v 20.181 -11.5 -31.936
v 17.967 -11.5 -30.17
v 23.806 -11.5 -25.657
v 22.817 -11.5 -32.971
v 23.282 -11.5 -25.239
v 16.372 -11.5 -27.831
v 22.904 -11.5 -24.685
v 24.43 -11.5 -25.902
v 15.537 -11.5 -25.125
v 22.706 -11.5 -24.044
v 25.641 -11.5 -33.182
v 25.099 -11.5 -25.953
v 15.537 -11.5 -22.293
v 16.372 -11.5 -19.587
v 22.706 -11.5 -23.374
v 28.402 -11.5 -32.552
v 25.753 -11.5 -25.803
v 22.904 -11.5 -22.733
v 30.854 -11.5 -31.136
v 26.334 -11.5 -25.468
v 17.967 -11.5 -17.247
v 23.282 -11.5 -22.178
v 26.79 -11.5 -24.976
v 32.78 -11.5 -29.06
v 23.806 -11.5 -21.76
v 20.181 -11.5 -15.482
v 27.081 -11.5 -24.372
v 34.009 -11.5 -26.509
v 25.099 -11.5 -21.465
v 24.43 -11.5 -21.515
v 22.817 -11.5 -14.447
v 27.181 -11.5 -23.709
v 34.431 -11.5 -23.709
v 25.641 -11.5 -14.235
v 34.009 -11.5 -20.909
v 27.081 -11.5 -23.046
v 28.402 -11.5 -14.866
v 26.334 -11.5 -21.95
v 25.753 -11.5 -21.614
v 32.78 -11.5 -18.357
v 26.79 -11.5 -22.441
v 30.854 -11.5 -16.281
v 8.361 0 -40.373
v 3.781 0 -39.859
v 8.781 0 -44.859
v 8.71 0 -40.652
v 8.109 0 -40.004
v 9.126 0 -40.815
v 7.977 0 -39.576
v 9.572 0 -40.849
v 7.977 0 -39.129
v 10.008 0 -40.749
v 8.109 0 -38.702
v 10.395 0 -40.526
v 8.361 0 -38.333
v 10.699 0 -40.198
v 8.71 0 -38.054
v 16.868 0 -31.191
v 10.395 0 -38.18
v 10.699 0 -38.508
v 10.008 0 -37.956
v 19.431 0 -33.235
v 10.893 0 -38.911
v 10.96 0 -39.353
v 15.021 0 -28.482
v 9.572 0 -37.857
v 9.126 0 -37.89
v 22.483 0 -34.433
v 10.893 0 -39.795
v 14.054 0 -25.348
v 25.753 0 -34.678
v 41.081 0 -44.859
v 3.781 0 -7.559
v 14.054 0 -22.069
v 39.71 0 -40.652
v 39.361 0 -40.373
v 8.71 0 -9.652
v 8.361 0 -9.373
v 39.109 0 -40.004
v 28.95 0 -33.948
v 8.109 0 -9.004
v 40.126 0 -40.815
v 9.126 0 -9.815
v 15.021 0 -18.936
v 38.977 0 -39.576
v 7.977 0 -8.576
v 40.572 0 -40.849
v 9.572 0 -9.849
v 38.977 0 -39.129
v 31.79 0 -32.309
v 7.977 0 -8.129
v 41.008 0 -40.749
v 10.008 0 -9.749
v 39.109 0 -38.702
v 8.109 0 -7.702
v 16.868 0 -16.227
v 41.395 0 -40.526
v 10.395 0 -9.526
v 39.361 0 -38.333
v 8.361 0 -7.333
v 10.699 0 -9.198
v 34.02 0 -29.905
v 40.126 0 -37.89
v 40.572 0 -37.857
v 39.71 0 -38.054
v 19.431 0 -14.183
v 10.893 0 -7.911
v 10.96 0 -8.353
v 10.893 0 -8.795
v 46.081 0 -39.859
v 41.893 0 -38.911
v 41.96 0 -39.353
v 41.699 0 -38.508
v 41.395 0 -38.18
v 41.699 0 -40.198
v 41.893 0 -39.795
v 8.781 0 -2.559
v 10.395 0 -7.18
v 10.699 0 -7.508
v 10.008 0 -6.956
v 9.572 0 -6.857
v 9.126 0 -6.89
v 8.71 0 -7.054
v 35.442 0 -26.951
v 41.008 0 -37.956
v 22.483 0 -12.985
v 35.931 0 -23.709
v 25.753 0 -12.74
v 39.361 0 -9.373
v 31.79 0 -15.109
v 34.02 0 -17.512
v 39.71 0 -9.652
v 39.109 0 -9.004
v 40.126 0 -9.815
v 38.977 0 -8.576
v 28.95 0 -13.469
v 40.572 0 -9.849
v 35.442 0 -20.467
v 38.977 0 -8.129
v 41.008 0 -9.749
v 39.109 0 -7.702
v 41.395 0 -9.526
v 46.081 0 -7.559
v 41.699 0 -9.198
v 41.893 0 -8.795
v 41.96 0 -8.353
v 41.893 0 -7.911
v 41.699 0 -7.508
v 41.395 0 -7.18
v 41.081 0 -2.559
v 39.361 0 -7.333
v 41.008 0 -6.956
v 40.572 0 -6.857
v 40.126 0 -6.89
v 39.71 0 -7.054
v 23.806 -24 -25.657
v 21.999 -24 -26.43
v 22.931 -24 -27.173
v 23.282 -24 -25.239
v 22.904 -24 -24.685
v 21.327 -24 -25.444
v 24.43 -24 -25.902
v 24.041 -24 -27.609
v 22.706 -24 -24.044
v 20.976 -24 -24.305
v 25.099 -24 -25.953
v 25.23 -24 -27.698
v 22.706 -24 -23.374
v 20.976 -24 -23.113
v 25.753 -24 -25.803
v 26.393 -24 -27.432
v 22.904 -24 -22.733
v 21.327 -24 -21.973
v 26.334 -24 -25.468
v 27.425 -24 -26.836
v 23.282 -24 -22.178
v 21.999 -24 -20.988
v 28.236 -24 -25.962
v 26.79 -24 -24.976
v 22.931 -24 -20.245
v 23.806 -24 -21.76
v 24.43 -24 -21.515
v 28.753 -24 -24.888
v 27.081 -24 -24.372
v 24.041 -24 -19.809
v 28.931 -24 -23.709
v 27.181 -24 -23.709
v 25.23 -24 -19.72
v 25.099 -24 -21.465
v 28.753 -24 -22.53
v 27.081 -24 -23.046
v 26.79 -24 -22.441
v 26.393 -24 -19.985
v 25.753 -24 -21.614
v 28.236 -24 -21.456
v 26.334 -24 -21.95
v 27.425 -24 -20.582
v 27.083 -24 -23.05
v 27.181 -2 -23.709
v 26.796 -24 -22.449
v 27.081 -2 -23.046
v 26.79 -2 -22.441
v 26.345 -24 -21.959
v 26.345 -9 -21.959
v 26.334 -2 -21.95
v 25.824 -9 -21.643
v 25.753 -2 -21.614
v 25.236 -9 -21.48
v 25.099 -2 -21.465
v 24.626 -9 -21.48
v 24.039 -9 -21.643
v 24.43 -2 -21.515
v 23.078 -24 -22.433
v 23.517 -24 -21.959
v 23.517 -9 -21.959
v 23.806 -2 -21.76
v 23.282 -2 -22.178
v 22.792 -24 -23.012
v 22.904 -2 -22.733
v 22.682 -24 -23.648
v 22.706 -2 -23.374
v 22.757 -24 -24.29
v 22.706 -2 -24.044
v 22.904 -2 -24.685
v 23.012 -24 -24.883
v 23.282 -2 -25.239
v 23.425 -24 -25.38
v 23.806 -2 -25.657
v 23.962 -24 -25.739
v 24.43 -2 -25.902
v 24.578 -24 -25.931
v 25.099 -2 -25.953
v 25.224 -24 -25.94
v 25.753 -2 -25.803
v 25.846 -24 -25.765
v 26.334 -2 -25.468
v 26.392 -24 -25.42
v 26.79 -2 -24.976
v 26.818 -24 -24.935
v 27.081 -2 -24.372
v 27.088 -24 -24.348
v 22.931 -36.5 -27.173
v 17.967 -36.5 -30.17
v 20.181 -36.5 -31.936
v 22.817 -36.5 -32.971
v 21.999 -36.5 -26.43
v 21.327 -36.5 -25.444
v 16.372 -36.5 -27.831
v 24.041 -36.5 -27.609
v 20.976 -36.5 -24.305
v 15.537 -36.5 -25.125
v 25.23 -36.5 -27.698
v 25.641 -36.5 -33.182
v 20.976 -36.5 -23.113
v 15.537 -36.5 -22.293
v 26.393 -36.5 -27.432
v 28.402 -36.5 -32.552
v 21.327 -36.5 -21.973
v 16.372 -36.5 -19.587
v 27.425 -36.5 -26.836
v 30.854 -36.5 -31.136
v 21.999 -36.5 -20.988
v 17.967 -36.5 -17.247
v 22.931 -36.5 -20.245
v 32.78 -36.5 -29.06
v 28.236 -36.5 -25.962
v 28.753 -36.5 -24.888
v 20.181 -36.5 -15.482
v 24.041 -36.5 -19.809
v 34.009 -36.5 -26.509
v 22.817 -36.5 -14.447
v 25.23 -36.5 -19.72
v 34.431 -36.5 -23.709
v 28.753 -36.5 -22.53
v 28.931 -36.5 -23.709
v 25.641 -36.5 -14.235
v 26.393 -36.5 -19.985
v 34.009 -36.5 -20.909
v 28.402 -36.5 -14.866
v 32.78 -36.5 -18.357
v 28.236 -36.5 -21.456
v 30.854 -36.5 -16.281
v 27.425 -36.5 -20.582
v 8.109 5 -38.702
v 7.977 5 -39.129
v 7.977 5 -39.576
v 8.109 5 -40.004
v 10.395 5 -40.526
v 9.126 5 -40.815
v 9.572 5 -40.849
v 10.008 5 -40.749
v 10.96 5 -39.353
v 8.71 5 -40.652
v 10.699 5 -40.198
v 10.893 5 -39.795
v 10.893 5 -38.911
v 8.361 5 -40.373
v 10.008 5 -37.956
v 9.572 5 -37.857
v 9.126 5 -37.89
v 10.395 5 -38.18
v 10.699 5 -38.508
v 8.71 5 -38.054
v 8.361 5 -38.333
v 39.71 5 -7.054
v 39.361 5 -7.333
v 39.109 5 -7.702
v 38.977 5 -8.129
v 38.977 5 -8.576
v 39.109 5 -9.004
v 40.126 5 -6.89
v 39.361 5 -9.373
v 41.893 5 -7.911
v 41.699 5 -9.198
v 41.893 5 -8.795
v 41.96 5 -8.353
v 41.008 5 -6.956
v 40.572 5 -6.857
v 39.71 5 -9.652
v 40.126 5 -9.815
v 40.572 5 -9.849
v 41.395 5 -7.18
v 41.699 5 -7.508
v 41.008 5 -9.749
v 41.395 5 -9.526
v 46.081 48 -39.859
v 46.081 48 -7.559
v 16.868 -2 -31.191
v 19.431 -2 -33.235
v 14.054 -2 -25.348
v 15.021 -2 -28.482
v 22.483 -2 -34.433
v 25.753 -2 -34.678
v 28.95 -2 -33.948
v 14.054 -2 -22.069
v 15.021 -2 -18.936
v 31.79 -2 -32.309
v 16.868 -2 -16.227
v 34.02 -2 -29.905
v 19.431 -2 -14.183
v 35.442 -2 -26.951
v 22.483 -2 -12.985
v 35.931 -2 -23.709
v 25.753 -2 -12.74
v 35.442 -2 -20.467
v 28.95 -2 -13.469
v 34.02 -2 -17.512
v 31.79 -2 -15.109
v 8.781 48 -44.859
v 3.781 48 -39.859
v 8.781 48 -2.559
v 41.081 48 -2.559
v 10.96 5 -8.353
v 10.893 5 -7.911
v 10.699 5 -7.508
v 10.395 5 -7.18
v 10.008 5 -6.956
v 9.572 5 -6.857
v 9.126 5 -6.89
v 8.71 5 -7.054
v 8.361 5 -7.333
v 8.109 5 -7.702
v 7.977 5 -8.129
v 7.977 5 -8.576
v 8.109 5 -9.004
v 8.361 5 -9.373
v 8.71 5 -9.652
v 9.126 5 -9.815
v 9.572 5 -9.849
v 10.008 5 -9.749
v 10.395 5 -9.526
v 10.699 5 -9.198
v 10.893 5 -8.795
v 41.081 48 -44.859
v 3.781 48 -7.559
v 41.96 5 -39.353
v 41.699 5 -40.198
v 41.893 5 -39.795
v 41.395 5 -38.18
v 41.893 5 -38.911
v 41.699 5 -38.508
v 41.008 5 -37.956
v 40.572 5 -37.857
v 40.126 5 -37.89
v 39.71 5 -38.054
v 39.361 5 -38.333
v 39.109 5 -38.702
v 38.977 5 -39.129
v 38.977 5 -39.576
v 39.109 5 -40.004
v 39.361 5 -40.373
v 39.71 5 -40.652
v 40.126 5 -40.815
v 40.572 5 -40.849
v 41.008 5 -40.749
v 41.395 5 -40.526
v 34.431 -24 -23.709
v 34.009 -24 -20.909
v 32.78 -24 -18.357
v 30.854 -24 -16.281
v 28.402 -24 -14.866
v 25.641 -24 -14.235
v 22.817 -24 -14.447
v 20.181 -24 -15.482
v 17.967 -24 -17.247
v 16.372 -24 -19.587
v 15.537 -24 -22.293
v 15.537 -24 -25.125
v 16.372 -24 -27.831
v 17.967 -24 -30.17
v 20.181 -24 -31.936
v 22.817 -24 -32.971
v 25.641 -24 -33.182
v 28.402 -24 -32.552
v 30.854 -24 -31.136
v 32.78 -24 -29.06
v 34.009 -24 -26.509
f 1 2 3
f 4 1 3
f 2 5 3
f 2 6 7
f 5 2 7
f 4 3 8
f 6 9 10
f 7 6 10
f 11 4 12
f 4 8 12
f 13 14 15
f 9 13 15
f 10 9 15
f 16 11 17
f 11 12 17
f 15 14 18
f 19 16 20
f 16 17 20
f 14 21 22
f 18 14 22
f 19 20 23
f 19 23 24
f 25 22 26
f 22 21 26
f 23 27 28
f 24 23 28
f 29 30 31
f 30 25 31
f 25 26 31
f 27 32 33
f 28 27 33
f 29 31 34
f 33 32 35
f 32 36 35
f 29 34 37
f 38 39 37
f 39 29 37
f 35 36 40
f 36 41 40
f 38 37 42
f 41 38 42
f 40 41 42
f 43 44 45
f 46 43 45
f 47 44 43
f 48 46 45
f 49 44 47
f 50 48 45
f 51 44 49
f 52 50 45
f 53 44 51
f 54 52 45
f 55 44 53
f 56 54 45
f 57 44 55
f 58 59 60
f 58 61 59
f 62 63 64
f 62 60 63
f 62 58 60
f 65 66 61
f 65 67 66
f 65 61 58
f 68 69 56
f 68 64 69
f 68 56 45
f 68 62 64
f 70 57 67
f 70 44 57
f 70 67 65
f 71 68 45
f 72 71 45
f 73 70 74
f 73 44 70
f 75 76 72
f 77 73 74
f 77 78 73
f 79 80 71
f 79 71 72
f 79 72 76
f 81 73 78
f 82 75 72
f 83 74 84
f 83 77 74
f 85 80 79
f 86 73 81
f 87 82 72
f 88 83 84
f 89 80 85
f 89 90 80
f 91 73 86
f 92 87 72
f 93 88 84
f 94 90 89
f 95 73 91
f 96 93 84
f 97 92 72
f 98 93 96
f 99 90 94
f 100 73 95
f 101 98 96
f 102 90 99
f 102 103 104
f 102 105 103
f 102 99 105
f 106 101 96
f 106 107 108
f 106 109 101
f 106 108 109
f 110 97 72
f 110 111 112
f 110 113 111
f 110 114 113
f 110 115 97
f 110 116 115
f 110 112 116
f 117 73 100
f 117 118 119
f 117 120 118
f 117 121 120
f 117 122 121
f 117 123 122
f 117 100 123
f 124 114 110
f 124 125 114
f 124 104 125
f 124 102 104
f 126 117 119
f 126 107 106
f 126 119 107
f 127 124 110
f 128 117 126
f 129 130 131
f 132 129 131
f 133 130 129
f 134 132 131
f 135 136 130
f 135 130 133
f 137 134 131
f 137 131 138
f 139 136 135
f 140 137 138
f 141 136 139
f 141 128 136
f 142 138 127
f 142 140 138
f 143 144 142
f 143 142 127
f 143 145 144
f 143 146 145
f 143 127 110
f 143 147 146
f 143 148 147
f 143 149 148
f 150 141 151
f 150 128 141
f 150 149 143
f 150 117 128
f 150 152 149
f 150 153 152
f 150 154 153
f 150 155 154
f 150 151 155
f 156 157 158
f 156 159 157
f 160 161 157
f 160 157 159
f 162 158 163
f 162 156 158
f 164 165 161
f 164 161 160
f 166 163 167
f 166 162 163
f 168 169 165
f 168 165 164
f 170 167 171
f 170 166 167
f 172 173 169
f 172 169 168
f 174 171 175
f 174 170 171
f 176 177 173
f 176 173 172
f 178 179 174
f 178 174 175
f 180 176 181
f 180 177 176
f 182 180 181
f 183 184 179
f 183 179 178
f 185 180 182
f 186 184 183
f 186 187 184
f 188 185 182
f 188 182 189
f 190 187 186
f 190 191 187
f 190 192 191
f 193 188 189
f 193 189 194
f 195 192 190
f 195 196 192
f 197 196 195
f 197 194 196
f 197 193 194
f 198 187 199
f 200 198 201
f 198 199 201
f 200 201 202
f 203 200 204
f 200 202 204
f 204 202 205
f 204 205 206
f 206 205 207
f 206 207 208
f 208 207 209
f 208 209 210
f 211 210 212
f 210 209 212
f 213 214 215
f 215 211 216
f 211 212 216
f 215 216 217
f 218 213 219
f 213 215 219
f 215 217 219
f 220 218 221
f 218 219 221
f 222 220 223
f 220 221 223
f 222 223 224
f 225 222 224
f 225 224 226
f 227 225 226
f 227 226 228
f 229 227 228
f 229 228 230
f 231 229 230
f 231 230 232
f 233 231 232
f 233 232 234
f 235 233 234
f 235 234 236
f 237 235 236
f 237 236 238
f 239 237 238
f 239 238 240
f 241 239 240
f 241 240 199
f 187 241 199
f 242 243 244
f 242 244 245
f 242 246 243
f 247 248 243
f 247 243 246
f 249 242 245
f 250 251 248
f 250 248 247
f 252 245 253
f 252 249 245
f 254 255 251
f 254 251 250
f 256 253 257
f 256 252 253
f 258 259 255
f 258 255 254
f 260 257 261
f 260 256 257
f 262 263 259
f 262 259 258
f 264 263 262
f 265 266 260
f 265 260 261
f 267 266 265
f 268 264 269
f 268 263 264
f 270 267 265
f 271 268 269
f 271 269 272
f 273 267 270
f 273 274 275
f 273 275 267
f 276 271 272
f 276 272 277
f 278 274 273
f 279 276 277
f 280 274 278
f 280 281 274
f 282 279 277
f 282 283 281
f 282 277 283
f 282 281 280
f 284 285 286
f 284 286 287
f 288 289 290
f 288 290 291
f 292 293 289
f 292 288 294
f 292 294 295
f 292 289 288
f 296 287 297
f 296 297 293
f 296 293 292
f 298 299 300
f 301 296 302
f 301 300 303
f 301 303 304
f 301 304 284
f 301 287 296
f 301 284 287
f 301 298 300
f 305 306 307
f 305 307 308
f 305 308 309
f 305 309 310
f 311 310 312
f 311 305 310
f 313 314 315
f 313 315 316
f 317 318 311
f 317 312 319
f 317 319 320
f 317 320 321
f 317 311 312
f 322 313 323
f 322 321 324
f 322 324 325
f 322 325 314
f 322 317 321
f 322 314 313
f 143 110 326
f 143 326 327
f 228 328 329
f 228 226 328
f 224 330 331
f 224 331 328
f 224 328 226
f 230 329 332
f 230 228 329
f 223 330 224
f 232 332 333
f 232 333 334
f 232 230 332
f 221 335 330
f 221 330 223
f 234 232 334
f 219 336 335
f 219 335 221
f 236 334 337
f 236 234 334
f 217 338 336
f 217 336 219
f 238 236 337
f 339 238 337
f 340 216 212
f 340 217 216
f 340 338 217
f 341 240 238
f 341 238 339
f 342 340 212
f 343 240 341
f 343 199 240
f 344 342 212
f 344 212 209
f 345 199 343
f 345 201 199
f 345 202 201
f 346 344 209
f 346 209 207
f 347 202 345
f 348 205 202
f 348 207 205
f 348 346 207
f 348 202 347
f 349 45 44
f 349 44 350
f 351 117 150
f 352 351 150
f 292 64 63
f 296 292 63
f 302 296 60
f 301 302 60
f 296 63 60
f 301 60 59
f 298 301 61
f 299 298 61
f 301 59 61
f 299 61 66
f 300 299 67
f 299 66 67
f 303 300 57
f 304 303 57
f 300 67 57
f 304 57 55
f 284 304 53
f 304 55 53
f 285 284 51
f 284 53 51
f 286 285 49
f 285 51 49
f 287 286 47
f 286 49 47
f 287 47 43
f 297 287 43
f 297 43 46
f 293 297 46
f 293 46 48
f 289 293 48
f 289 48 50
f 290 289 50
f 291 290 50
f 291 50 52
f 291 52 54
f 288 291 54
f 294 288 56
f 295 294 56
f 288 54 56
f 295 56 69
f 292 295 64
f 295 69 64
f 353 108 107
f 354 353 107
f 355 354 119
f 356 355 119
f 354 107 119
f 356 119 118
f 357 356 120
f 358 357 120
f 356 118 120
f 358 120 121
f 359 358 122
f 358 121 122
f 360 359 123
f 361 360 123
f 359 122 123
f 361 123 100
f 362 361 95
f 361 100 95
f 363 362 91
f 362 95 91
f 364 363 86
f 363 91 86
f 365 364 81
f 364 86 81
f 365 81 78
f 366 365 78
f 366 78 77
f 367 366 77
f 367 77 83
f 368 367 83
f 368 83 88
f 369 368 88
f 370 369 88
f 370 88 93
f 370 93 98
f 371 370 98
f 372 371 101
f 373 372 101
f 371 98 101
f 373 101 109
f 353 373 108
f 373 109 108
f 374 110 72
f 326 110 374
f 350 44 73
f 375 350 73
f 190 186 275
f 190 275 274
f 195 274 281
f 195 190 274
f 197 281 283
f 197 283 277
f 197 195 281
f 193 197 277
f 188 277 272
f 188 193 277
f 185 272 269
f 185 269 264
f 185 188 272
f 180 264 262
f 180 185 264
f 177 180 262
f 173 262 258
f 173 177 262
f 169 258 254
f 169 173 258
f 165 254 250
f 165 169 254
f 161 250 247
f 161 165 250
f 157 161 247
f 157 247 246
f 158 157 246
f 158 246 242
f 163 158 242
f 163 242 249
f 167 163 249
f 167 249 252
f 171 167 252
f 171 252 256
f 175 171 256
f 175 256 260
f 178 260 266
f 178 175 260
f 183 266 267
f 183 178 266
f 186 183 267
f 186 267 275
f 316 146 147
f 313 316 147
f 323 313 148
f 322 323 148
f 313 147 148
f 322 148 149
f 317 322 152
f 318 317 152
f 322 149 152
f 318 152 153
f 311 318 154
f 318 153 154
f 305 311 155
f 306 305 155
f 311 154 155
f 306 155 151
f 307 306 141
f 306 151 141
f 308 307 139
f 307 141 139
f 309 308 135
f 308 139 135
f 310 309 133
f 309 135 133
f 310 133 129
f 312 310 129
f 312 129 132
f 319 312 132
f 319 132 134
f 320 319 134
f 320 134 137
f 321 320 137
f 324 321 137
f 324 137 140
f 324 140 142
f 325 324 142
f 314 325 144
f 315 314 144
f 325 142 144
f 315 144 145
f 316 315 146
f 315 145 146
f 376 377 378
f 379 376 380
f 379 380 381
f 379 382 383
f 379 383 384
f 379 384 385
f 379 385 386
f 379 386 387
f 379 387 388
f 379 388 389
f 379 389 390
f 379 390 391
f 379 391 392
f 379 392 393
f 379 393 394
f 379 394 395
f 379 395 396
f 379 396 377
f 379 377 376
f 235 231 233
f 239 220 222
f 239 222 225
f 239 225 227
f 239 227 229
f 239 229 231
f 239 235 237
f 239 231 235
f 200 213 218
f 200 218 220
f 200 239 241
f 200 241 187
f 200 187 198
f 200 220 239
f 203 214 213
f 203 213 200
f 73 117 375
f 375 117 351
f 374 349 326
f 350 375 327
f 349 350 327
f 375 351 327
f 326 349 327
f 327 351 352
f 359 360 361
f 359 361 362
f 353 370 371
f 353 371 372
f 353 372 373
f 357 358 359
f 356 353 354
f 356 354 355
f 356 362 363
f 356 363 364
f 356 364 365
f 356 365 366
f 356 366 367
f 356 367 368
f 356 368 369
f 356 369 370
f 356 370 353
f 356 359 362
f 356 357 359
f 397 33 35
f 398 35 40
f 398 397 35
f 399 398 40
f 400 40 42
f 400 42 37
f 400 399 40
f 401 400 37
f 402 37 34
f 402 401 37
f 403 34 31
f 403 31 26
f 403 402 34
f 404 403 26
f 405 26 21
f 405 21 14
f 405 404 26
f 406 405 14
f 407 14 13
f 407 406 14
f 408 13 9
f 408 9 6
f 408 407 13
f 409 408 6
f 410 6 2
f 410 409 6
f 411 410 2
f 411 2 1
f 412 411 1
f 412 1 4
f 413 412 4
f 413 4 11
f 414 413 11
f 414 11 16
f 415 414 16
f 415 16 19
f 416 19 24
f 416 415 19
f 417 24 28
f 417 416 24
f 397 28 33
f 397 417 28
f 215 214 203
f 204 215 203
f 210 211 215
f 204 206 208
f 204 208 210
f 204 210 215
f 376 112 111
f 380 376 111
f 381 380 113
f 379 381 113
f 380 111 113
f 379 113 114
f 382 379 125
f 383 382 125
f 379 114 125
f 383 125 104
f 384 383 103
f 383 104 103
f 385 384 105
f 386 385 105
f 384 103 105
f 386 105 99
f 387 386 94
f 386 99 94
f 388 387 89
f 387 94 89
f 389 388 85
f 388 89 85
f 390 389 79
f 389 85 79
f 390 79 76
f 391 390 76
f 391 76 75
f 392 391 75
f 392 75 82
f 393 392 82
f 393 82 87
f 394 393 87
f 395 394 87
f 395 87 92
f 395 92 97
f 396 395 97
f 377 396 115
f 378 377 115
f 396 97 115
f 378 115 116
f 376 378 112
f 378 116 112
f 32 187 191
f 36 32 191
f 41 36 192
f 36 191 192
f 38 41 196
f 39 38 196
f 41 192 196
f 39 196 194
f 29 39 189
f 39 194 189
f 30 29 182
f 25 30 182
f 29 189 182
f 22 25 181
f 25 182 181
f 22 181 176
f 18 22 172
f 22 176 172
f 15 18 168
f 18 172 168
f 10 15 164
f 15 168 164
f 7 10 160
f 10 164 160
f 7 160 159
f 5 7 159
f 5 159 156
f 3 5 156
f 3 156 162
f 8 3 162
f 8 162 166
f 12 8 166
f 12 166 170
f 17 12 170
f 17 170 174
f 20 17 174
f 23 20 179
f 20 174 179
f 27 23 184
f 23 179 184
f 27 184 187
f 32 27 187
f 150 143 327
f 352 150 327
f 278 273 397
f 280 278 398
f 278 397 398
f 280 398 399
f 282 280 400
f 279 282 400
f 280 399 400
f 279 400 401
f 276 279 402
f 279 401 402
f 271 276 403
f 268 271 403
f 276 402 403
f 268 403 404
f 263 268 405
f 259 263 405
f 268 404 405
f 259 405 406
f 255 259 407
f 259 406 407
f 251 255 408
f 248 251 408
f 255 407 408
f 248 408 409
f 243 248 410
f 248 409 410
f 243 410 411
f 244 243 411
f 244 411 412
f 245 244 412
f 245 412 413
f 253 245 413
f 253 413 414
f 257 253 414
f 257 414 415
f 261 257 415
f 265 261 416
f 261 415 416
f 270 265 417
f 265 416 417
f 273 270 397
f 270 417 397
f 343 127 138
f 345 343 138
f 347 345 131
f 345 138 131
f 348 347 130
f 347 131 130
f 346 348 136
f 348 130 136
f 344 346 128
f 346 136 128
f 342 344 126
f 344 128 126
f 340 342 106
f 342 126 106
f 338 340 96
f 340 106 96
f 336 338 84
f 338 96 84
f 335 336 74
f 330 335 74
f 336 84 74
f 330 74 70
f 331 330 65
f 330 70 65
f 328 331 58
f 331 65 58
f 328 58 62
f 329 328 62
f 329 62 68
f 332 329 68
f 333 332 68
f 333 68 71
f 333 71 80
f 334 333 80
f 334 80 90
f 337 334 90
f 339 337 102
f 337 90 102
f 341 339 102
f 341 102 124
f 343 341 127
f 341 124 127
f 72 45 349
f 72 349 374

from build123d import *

# Parameters (mm, degrees)
F0_W      = 42.3
F0_H      = 42.3
F0_R      = 11
F0_R_2    = 2.25
F1_DEPTH  = 48
F2_DEPTH  = 2
F3_DEPTH  = 24
F4_SIZE   = 5
F5_R      = 1.5
F6_DEPTH  = 5
F9_DEPTH  = 15
F10_R     = 9.5
F10_R_2   = 2.25
F11_DEPTH = 12.5
F12_R     = 9.5
F12_R_2   = 4
F13_DEPTH = 12.5


with BuildPart() as f1:
    # F0 (on Front) → F1 (new body)
    with BuildSketch(Plane.XZ):
        with Locations((24.9311704397, -23.708854264)):
            Rectangle(F0_W, F0_H)
        with Locations((24.9311704397, -23.708854264)):
            Circle(F0_R, mode=Mode.SUBTRACT)
        with Locations((24.9311704397, -23.708854264)):
            Circle(F0_R)
        with Locations((24.9311704397, -23.708854264)):
            Circle(F0_R_2, mode=Mode.SUBTRACT)
        with Locations((24.9311704397, -23.708854264)):
            Circle(F0_R_2)
    extrude(amount=-F1_DEPTH)

    # F0 (on Front) → F2 (join)
    with BuildSketch(Plane.XZ):
        with Locations((24.9311704397, -23.708854264)):
            Circle(F0_R)
        with Locations((24.9311704397, -23.708854264)):
            Circle(F0_R_2, mode=Mode.SUBTRACT)
    extrude(amount=F2_DEPTH)

    # F0 (on Front) → F3 (join)
    with BuildSketch(Plane.XZ):
        with Locations((24.9311704397, -23.708854264)):
            Circle(F0_R_2)
    extrude(amount=F3_DEPTH)

    # F4
    f4_edges = [f1.edges().sort_by_distance(p)[0] for p in [
        (46.08117, 24, -2.558854),
        (3.78117, 24, -2.558854),
        (46.08117, 24, -44.858854),
        (3.78117, 24, -44.858854),
    ]]
    chamfer(f4_edges, length=F4_SIZE)

    # F5 (on face) → F6 (cut)
    with BuildSketch(Plane.XZ):
        with Locations((9.4601102173, -8.3527764827)):
            Circle(F5_R)
        with Locations((40.4601102173, -8.3527764827)):
            Circle(F5_R)
        with Locations((9.4601102173, -39.3527764827)):
            Circle(F5_R)
        with Locations((40.4601102173, -39.3527764827)):
            Circle(F5_R)
    extrude(amount=-F6_DEPTH, mode=Mode.SUBTRACT)

    # F8 (on face) → F9 (cut)
    with BuildSketch(Plane.XZ.offset(24)):
        with BuildLine():
            Line((23.5169568773, -21.958854264), (26.3453840021, -21.958854264))
            ThreePointArc((26.3453840021, -21.958854264), (24.9311704397, -21.458854264), (23.5169568773, -21.958854264))
        make_face()
    extrude(amount=-F9_DEPTH, mode=Mode.SUBTRACT)


with BuildPart() as f11:
    # F10 (on face) → F11 (new body)
    with BuildSketch(Plane.XZ.offset(24)):
        with Locations((24.9311704397, -23.708854264)):
            Circle(F10_R)
        with Locations((24.9311704397, -23.708854264)):
            Circle(F10_R_2, mode=Mode.SUBTRACT)
    extrude(amount=-F11_DEPTH)

    # F12 (on face) → F13 (join)
    with BuildSketch(Plane.XZ.offset(24)):
        with Locations((24.9311704397, -23.708854264)):
            Circle(F12_R)
        with Locations((24.9311704397, -23.708854264)):
            Circle(F12_R_2, mode=Mode.SUBTRACT)
    extrude(amount=F13_DEPTH)


solid = Compound([f1.part, f11.part])
